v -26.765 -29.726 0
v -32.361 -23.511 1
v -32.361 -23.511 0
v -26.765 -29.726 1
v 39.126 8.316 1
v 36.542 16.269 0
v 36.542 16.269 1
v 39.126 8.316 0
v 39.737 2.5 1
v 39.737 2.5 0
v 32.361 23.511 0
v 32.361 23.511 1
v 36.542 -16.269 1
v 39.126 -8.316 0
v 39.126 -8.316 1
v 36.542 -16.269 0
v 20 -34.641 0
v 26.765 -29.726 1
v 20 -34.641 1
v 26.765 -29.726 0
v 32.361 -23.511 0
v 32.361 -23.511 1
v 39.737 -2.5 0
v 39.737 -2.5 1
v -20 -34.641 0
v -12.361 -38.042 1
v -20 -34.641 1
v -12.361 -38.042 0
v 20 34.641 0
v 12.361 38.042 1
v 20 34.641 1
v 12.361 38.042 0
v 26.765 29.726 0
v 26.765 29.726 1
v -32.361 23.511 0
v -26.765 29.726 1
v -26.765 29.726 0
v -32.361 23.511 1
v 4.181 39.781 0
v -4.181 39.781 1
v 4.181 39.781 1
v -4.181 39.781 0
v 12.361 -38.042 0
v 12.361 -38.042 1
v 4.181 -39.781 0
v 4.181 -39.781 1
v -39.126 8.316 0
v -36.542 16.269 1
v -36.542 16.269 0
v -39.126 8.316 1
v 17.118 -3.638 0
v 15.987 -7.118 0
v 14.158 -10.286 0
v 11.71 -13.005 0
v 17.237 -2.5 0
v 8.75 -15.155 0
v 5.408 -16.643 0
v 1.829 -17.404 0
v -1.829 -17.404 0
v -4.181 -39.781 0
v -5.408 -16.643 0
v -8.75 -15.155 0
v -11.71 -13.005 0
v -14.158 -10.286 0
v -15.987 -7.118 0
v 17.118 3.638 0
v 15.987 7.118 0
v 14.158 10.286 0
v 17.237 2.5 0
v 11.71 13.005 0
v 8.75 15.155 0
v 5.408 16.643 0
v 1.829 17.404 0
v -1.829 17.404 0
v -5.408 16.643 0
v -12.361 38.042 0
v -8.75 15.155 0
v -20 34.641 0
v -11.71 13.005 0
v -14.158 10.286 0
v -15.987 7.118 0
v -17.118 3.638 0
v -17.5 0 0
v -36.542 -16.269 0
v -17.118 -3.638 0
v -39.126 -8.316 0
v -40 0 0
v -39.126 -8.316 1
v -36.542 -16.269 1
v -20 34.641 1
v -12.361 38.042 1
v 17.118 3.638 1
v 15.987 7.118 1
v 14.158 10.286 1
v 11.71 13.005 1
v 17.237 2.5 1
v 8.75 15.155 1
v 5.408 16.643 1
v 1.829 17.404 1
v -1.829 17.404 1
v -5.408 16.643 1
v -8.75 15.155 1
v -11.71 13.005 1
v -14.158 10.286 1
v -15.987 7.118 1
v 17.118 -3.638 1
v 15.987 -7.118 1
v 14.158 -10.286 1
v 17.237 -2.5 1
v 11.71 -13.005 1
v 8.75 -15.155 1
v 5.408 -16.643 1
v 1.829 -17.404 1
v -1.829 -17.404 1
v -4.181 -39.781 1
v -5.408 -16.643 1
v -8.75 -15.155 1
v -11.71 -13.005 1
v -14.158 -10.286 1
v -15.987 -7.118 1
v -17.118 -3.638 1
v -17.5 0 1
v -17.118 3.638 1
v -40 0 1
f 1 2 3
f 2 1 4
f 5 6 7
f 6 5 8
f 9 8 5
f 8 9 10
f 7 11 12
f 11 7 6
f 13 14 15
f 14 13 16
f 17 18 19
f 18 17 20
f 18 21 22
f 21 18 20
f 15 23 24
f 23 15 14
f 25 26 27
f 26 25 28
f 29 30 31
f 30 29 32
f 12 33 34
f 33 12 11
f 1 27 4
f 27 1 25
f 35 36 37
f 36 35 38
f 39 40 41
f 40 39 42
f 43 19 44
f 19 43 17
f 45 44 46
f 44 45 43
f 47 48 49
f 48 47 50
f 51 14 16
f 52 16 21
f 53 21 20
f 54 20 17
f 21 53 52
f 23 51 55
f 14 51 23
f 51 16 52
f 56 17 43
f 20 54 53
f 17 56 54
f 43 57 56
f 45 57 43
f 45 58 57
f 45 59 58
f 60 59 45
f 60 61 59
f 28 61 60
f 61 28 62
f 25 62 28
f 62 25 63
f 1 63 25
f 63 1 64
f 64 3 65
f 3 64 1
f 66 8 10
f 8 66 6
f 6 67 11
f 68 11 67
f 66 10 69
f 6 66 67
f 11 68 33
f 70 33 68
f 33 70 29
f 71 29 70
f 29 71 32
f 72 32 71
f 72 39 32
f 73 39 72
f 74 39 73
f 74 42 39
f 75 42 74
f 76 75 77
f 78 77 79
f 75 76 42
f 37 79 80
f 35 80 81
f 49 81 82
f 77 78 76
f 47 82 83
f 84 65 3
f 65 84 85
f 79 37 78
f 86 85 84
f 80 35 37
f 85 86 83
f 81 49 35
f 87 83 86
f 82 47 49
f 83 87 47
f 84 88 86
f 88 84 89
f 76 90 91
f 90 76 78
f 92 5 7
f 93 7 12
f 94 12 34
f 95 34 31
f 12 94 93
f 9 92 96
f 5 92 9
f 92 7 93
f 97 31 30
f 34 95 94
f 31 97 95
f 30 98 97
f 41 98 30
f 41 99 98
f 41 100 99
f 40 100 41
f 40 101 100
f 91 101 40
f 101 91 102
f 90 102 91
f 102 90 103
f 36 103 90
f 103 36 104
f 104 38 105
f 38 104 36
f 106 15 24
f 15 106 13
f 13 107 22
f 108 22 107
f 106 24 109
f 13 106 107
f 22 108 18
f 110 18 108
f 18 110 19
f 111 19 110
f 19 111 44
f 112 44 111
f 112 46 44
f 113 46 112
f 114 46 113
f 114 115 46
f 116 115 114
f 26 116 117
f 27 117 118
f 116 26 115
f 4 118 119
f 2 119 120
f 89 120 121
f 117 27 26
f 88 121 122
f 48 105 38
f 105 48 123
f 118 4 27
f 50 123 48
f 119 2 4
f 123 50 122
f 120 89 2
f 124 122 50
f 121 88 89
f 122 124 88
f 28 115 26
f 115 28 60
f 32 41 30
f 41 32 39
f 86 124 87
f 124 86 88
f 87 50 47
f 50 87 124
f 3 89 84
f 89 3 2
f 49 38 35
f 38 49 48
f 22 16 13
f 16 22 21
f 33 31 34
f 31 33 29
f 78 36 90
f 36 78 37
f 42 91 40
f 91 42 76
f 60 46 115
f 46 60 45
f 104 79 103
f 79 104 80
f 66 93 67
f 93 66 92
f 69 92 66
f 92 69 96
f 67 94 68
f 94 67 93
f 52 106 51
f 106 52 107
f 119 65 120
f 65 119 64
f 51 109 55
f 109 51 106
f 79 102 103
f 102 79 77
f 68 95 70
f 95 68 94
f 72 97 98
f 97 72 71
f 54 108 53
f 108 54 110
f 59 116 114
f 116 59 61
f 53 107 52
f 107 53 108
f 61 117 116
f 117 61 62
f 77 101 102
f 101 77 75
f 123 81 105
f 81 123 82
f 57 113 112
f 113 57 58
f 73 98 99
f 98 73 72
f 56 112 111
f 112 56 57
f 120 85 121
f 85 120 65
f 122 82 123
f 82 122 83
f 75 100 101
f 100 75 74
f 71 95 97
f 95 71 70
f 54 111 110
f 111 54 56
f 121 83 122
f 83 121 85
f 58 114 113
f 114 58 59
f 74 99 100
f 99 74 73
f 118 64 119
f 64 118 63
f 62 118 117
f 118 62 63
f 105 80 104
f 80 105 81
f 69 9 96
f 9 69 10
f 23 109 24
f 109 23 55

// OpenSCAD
/* Simple Clothing Rack Divider */

// Inner Hole Diameter
inner = 35;

// Outer Hole Diameter
outer = 80;

// Thickness
thick = 1;

// Cutout Size
cutout= 5;

difference() {
cylinder(r=outer/2, h=thick);
#translate([0  , 0  , -thick/2])cylinder(r=inner/2, h=thick*2);
#translate([0  , -cutout/2  , -thick/2])cube([outer, cutout, thick*2]);
}
